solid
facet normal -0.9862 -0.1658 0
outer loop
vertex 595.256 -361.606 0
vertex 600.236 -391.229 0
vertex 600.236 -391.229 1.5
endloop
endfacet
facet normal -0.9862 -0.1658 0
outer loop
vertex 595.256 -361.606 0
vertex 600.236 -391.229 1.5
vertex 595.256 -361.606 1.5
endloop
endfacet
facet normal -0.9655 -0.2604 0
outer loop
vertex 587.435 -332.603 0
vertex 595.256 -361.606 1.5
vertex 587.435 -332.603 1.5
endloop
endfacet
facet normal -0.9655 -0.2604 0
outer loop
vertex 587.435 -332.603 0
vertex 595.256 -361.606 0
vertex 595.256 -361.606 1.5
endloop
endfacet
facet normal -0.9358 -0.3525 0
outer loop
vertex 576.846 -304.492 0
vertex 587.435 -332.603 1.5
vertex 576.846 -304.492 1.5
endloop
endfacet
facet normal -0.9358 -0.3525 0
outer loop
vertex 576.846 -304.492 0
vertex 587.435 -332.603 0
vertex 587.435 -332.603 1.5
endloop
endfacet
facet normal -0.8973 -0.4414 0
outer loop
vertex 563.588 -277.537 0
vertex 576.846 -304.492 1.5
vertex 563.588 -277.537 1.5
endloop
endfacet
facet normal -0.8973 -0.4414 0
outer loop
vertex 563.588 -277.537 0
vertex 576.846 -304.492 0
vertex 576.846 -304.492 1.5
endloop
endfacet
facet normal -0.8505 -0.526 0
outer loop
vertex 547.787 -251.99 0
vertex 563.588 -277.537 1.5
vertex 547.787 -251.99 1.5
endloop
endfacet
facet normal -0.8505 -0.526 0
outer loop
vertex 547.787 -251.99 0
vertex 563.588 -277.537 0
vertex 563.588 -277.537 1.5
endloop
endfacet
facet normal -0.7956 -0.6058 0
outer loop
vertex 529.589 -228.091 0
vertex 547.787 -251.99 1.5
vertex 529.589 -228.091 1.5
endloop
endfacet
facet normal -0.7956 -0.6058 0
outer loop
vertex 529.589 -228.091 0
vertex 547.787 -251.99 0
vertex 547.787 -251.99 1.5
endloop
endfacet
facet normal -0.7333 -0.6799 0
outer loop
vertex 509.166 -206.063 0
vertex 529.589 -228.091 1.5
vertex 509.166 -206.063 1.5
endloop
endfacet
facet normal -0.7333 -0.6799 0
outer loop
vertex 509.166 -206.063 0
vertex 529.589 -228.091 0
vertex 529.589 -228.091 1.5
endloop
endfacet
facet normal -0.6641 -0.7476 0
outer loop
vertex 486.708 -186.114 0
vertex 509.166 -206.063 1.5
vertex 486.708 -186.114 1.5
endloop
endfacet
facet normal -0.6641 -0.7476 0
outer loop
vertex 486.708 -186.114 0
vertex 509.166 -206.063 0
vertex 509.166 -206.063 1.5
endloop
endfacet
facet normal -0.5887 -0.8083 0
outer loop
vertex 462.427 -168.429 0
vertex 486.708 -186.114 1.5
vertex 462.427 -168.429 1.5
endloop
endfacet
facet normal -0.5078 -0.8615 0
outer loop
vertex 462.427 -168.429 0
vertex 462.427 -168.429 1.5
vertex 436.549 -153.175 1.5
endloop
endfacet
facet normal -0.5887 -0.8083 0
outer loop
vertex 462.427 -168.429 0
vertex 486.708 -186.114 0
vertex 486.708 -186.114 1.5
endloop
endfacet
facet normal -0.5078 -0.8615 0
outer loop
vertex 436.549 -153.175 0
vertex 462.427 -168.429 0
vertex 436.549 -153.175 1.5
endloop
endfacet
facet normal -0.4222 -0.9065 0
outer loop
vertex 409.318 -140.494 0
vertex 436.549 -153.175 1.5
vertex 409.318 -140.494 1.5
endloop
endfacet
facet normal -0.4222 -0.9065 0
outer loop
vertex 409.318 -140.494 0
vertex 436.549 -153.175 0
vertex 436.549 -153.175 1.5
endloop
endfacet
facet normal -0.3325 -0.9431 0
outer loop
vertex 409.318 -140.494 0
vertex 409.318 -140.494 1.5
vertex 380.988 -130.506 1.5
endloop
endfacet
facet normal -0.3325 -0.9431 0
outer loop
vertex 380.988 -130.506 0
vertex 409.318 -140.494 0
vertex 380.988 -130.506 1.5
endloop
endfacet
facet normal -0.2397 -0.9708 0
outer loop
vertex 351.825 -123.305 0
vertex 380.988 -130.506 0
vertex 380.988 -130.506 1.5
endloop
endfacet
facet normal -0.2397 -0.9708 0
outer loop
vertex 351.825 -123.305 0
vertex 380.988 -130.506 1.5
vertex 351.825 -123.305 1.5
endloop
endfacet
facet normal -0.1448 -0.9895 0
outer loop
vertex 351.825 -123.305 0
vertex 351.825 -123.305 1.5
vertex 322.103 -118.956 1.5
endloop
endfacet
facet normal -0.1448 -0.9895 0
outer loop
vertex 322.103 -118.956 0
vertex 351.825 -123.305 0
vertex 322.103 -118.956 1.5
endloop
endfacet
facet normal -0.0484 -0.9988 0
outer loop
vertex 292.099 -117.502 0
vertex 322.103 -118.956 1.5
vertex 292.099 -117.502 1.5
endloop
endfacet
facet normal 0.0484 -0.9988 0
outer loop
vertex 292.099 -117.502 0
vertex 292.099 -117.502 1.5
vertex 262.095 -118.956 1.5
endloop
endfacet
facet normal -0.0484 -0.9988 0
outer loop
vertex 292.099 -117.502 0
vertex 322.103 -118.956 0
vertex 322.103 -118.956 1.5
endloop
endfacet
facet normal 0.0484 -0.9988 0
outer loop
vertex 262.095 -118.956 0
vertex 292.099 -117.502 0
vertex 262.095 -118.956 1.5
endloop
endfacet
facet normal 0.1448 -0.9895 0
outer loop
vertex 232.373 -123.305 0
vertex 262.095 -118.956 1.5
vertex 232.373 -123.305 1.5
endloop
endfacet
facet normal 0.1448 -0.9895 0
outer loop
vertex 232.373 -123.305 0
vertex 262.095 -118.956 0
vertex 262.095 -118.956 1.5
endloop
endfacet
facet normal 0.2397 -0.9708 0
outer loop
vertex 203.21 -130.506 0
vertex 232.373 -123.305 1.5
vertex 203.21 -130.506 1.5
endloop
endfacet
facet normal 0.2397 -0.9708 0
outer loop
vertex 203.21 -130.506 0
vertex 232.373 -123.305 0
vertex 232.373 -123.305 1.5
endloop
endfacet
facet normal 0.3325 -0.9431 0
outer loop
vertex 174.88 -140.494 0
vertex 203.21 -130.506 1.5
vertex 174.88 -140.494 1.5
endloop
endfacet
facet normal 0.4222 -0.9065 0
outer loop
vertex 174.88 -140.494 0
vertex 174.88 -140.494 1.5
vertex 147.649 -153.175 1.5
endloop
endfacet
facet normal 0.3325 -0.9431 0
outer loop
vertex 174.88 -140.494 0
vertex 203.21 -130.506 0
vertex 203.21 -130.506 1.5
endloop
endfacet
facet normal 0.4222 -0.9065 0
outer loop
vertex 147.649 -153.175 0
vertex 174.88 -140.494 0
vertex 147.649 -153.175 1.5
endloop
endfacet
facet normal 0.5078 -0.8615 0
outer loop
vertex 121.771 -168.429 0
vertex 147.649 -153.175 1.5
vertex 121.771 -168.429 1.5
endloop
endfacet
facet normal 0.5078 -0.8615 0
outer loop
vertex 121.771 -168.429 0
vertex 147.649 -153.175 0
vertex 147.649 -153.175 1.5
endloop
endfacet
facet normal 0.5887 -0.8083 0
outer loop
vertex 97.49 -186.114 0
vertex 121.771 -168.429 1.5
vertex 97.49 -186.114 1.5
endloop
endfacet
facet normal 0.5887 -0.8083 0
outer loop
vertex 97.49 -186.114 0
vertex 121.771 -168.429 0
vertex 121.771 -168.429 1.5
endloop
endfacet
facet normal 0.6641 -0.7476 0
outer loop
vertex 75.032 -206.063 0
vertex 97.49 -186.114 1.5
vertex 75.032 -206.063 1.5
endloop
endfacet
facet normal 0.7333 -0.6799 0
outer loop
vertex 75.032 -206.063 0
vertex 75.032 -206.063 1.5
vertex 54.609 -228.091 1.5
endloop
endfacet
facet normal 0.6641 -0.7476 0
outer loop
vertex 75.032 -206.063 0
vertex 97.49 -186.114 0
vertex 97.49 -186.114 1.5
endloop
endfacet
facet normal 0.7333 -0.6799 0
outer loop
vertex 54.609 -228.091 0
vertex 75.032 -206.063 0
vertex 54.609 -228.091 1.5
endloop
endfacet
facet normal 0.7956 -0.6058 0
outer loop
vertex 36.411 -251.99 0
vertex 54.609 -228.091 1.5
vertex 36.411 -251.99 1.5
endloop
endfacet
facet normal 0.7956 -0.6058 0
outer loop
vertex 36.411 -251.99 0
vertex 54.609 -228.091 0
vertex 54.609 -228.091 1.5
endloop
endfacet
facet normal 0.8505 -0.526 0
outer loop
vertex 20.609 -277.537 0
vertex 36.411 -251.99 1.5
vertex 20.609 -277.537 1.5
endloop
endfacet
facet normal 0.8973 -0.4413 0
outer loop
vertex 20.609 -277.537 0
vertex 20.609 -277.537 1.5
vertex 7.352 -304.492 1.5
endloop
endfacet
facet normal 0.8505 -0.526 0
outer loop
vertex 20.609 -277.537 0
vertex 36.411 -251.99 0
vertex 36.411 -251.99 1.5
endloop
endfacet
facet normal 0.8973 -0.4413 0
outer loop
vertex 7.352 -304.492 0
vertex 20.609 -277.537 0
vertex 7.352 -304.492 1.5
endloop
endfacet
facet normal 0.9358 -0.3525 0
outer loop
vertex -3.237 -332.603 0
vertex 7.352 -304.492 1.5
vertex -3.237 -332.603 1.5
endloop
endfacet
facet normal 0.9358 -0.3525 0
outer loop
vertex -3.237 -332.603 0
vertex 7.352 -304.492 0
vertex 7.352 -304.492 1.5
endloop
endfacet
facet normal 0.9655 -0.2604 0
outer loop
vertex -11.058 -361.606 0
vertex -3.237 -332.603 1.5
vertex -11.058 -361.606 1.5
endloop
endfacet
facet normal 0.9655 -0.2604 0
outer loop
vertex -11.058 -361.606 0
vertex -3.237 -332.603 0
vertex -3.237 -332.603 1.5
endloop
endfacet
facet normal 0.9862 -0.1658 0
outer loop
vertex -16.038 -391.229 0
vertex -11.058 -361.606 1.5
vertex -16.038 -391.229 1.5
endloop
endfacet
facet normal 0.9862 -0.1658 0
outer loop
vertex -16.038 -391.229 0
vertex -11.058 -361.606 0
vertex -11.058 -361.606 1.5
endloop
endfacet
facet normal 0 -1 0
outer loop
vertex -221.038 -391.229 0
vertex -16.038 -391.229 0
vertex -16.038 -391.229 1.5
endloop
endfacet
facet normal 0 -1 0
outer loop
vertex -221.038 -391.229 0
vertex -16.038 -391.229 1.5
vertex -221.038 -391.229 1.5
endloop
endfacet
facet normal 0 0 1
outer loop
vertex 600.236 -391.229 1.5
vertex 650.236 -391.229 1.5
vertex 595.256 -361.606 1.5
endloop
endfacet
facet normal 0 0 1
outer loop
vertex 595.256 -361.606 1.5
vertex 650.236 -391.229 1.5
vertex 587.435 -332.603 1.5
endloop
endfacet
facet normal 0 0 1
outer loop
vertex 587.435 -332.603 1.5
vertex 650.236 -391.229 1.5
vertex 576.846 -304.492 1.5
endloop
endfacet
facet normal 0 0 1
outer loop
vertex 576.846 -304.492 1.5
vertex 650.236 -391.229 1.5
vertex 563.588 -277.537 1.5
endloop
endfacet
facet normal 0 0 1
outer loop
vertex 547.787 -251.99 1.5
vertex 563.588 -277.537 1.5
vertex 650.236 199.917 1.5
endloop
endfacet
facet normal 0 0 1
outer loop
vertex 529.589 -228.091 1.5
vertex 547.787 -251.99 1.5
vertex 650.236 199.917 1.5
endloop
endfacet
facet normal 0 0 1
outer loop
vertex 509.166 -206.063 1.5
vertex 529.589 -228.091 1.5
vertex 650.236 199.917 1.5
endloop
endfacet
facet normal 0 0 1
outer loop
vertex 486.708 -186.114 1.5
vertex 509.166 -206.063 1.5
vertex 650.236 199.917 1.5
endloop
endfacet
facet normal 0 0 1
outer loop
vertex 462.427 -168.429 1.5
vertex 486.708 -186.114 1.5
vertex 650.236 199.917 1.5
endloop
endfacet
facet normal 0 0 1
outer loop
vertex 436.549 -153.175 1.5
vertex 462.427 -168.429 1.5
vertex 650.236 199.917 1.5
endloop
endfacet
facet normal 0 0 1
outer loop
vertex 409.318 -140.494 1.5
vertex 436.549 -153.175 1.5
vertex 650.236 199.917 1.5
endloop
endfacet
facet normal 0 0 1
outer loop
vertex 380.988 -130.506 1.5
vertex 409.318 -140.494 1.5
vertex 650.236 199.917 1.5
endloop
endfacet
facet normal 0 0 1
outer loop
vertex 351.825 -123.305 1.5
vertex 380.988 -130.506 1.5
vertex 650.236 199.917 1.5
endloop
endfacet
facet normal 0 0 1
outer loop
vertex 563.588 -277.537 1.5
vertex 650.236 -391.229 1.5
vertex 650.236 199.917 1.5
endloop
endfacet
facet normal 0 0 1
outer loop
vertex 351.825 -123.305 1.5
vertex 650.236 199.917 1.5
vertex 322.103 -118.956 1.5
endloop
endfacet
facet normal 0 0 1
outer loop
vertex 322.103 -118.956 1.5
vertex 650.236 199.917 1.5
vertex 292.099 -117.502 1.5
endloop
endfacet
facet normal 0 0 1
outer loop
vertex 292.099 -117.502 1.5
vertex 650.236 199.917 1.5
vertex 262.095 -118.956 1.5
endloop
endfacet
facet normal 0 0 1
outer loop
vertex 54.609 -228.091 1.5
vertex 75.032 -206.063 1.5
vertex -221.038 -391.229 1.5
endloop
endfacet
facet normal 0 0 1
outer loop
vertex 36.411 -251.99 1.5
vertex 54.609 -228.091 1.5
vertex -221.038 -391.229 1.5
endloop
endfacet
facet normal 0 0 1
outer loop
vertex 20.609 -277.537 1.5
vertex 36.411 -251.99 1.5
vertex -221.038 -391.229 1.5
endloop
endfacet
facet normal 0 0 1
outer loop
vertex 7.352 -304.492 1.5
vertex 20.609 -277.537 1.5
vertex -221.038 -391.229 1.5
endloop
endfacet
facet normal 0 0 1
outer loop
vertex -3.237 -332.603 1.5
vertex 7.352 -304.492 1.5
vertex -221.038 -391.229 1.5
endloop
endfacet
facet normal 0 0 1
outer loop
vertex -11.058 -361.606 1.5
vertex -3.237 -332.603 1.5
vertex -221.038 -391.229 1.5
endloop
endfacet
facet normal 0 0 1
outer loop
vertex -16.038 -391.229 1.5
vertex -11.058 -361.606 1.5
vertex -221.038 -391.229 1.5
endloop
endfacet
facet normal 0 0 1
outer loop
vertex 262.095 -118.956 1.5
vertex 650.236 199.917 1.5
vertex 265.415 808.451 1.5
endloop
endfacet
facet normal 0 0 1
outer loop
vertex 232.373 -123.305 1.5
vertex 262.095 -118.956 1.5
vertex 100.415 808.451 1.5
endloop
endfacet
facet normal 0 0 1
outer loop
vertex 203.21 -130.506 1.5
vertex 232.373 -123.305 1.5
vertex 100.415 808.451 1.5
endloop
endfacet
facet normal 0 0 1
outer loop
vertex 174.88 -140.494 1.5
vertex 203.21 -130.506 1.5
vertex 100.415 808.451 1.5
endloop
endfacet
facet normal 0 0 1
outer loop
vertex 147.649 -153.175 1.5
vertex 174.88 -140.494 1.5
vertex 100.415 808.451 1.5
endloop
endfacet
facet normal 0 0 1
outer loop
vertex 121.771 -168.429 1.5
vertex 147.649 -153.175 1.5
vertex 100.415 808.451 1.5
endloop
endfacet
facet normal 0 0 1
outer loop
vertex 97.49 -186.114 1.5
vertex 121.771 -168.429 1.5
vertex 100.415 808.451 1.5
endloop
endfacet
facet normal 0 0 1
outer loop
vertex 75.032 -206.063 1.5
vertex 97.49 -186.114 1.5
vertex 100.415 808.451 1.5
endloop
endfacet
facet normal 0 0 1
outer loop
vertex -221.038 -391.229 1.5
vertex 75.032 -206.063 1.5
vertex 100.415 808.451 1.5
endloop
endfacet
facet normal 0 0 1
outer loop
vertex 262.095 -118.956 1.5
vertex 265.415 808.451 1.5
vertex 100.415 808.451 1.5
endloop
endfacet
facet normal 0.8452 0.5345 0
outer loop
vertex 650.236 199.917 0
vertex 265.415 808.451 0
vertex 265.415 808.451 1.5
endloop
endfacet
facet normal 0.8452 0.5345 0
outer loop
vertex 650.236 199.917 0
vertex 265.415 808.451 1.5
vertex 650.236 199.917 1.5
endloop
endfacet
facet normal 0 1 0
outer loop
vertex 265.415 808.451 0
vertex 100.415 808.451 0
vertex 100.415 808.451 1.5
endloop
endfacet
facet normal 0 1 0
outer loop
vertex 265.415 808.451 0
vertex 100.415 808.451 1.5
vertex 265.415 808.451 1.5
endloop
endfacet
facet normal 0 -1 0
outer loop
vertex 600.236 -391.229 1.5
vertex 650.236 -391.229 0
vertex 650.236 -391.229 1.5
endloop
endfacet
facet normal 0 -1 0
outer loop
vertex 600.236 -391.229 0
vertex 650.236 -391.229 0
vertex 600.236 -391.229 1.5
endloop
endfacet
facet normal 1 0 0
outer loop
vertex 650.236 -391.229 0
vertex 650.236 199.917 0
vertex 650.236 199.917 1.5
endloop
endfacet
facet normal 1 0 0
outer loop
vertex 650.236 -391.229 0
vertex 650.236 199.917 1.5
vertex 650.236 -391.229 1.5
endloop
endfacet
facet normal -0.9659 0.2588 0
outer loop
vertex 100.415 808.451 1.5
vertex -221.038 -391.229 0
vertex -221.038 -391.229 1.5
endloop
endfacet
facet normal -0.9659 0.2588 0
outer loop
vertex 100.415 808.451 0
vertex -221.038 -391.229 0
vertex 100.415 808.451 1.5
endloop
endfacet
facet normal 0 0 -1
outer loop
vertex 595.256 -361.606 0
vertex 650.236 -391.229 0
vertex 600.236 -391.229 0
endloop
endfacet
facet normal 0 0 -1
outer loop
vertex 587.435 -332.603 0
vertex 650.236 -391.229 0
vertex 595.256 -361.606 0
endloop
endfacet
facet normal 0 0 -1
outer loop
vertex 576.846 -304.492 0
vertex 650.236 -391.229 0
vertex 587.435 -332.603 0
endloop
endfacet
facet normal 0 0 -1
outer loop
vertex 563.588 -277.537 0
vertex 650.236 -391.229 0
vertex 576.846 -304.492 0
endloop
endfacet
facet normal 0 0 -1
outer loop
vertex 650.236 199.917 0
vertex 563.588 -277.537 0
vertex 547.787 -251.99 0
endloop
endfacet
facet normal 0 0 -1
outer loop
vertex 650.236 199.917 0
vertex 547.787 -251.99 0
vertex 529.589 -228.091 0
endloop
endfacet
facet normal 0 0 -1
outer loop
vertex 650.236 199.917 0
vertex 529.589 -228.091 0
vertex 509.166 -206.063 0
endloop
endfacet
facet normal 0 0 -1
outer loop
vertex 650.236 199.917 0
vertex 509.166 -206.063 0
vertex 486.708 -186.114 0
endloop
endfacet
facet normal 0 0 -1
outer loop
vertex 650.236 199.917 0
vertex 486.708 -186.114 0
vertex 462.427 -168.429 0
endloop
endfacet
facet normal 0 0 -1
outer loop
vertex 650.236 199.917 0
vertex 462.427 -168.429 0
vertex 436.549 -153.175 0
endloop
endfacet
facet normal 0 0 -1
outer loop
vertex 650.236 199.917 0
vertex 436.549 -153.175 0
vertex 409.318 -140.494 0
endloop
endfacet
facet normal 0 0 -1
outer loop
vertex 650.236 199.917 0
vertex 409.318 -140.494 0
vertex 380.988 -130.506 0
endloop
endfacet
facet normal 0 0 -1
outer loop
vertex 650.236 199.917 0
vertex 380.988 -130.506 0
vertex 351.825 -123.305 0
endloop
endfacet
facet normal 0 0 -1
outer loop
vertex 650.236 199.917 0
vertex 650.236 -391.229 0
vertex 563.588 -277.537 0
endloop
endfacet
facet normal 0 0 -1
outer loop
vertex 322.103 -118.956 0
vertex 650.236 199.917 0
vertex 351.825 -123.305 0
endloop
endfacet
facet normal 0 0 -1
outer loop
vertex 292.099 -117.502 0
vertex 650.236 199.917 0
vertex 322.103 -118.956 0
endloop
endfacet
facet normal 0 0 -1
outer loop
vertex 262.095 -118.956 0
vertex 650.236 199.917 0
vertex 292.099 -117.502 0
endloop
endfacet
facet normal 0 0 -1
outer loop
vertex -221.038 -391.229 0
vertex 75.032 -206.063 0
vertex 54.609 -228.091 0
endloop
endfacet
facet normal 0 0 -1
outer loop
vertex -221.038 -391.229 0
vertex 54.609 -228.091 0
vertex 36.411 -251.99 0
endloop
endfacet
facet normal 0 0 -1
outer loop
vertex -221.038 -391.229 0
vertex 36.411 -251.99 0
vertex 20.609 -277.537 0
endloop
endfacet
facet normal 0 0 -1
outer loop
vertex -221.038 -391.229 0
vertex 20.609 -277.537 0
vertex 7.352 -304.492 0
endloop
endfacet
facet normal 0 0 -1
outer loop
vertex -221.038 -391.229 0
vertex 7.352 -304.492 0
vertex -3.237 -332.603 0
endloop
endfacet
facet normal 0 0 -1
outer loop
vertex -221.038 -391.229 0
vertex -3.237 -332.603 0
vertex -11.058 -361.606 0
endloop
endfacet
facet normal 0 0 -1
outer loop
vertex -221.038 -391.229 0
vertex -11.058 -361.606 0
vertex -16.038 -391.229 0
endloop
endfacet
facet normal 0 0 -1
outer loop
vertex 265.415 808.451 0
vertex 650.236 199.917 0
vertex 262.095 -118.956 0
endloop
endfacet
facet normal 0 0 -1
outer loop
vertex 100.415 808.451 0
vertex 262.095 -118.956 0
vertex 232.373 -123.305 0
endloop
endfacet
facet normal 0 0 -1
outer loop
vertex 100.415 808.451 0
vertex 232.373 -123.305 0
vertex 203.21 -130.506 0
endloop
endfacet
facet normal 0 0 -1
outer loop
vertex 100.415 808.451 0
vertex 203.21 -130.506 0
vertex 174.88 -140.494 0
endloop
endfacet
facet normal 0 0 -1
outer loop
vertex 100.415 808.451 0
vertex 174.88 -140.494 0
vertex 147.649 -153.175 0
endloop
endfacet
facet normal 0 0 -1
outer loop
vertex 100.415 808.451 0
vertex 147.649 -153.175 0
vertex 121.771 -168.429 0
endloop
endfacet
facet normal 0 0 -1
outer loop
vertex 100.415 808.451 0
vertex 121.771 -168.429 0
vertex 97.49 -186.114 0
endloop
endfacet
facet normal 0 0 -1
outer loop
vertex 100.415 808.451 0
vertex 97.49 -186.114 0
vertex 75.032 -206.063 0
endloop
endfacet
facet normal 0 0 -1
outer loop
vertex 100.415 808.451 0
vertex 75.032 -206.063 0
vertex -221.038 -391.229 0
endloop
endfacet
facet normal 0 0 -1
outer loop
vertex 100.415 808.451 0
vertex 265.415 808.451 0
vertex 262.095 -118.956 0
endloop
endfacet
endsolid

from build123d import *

# Parameters (mm, degrees)
BOSS_EXTRUDE1_DEPTH = 1.5


with BuildPart() as part:
    # Sketch1 → Boss-Extrude1 (new body)
    with BuildSketch(Plane.XY):
        with BuildLine():
            Line((100.41499283, 808.450676409), (265.41499283, 808.450676409))
            Line((265.41499283, 808.450676409), (650.236066342, 199.917405846))
            Line((650.236066342, 199.917405846), (650.236066342, -391.229199842))
            Line((650.236066342, -391.229199842), (600.236066342, -391.229199842))
            ThreePointArc((600.236066342, -391.229199842), (292.098902578, -117.502355805), (-16.038261187, -391.229199842))
            Line((-16.038261187, -391.229199842), (-221.038261187, -391.229199842))
            Line((-221.038261187, -391.229199842), (100.41499283, 808.450676409))
        make_face()
    extrude(amount=BOSS_EXTRUDE1_DEPTH)


solid = part.part
